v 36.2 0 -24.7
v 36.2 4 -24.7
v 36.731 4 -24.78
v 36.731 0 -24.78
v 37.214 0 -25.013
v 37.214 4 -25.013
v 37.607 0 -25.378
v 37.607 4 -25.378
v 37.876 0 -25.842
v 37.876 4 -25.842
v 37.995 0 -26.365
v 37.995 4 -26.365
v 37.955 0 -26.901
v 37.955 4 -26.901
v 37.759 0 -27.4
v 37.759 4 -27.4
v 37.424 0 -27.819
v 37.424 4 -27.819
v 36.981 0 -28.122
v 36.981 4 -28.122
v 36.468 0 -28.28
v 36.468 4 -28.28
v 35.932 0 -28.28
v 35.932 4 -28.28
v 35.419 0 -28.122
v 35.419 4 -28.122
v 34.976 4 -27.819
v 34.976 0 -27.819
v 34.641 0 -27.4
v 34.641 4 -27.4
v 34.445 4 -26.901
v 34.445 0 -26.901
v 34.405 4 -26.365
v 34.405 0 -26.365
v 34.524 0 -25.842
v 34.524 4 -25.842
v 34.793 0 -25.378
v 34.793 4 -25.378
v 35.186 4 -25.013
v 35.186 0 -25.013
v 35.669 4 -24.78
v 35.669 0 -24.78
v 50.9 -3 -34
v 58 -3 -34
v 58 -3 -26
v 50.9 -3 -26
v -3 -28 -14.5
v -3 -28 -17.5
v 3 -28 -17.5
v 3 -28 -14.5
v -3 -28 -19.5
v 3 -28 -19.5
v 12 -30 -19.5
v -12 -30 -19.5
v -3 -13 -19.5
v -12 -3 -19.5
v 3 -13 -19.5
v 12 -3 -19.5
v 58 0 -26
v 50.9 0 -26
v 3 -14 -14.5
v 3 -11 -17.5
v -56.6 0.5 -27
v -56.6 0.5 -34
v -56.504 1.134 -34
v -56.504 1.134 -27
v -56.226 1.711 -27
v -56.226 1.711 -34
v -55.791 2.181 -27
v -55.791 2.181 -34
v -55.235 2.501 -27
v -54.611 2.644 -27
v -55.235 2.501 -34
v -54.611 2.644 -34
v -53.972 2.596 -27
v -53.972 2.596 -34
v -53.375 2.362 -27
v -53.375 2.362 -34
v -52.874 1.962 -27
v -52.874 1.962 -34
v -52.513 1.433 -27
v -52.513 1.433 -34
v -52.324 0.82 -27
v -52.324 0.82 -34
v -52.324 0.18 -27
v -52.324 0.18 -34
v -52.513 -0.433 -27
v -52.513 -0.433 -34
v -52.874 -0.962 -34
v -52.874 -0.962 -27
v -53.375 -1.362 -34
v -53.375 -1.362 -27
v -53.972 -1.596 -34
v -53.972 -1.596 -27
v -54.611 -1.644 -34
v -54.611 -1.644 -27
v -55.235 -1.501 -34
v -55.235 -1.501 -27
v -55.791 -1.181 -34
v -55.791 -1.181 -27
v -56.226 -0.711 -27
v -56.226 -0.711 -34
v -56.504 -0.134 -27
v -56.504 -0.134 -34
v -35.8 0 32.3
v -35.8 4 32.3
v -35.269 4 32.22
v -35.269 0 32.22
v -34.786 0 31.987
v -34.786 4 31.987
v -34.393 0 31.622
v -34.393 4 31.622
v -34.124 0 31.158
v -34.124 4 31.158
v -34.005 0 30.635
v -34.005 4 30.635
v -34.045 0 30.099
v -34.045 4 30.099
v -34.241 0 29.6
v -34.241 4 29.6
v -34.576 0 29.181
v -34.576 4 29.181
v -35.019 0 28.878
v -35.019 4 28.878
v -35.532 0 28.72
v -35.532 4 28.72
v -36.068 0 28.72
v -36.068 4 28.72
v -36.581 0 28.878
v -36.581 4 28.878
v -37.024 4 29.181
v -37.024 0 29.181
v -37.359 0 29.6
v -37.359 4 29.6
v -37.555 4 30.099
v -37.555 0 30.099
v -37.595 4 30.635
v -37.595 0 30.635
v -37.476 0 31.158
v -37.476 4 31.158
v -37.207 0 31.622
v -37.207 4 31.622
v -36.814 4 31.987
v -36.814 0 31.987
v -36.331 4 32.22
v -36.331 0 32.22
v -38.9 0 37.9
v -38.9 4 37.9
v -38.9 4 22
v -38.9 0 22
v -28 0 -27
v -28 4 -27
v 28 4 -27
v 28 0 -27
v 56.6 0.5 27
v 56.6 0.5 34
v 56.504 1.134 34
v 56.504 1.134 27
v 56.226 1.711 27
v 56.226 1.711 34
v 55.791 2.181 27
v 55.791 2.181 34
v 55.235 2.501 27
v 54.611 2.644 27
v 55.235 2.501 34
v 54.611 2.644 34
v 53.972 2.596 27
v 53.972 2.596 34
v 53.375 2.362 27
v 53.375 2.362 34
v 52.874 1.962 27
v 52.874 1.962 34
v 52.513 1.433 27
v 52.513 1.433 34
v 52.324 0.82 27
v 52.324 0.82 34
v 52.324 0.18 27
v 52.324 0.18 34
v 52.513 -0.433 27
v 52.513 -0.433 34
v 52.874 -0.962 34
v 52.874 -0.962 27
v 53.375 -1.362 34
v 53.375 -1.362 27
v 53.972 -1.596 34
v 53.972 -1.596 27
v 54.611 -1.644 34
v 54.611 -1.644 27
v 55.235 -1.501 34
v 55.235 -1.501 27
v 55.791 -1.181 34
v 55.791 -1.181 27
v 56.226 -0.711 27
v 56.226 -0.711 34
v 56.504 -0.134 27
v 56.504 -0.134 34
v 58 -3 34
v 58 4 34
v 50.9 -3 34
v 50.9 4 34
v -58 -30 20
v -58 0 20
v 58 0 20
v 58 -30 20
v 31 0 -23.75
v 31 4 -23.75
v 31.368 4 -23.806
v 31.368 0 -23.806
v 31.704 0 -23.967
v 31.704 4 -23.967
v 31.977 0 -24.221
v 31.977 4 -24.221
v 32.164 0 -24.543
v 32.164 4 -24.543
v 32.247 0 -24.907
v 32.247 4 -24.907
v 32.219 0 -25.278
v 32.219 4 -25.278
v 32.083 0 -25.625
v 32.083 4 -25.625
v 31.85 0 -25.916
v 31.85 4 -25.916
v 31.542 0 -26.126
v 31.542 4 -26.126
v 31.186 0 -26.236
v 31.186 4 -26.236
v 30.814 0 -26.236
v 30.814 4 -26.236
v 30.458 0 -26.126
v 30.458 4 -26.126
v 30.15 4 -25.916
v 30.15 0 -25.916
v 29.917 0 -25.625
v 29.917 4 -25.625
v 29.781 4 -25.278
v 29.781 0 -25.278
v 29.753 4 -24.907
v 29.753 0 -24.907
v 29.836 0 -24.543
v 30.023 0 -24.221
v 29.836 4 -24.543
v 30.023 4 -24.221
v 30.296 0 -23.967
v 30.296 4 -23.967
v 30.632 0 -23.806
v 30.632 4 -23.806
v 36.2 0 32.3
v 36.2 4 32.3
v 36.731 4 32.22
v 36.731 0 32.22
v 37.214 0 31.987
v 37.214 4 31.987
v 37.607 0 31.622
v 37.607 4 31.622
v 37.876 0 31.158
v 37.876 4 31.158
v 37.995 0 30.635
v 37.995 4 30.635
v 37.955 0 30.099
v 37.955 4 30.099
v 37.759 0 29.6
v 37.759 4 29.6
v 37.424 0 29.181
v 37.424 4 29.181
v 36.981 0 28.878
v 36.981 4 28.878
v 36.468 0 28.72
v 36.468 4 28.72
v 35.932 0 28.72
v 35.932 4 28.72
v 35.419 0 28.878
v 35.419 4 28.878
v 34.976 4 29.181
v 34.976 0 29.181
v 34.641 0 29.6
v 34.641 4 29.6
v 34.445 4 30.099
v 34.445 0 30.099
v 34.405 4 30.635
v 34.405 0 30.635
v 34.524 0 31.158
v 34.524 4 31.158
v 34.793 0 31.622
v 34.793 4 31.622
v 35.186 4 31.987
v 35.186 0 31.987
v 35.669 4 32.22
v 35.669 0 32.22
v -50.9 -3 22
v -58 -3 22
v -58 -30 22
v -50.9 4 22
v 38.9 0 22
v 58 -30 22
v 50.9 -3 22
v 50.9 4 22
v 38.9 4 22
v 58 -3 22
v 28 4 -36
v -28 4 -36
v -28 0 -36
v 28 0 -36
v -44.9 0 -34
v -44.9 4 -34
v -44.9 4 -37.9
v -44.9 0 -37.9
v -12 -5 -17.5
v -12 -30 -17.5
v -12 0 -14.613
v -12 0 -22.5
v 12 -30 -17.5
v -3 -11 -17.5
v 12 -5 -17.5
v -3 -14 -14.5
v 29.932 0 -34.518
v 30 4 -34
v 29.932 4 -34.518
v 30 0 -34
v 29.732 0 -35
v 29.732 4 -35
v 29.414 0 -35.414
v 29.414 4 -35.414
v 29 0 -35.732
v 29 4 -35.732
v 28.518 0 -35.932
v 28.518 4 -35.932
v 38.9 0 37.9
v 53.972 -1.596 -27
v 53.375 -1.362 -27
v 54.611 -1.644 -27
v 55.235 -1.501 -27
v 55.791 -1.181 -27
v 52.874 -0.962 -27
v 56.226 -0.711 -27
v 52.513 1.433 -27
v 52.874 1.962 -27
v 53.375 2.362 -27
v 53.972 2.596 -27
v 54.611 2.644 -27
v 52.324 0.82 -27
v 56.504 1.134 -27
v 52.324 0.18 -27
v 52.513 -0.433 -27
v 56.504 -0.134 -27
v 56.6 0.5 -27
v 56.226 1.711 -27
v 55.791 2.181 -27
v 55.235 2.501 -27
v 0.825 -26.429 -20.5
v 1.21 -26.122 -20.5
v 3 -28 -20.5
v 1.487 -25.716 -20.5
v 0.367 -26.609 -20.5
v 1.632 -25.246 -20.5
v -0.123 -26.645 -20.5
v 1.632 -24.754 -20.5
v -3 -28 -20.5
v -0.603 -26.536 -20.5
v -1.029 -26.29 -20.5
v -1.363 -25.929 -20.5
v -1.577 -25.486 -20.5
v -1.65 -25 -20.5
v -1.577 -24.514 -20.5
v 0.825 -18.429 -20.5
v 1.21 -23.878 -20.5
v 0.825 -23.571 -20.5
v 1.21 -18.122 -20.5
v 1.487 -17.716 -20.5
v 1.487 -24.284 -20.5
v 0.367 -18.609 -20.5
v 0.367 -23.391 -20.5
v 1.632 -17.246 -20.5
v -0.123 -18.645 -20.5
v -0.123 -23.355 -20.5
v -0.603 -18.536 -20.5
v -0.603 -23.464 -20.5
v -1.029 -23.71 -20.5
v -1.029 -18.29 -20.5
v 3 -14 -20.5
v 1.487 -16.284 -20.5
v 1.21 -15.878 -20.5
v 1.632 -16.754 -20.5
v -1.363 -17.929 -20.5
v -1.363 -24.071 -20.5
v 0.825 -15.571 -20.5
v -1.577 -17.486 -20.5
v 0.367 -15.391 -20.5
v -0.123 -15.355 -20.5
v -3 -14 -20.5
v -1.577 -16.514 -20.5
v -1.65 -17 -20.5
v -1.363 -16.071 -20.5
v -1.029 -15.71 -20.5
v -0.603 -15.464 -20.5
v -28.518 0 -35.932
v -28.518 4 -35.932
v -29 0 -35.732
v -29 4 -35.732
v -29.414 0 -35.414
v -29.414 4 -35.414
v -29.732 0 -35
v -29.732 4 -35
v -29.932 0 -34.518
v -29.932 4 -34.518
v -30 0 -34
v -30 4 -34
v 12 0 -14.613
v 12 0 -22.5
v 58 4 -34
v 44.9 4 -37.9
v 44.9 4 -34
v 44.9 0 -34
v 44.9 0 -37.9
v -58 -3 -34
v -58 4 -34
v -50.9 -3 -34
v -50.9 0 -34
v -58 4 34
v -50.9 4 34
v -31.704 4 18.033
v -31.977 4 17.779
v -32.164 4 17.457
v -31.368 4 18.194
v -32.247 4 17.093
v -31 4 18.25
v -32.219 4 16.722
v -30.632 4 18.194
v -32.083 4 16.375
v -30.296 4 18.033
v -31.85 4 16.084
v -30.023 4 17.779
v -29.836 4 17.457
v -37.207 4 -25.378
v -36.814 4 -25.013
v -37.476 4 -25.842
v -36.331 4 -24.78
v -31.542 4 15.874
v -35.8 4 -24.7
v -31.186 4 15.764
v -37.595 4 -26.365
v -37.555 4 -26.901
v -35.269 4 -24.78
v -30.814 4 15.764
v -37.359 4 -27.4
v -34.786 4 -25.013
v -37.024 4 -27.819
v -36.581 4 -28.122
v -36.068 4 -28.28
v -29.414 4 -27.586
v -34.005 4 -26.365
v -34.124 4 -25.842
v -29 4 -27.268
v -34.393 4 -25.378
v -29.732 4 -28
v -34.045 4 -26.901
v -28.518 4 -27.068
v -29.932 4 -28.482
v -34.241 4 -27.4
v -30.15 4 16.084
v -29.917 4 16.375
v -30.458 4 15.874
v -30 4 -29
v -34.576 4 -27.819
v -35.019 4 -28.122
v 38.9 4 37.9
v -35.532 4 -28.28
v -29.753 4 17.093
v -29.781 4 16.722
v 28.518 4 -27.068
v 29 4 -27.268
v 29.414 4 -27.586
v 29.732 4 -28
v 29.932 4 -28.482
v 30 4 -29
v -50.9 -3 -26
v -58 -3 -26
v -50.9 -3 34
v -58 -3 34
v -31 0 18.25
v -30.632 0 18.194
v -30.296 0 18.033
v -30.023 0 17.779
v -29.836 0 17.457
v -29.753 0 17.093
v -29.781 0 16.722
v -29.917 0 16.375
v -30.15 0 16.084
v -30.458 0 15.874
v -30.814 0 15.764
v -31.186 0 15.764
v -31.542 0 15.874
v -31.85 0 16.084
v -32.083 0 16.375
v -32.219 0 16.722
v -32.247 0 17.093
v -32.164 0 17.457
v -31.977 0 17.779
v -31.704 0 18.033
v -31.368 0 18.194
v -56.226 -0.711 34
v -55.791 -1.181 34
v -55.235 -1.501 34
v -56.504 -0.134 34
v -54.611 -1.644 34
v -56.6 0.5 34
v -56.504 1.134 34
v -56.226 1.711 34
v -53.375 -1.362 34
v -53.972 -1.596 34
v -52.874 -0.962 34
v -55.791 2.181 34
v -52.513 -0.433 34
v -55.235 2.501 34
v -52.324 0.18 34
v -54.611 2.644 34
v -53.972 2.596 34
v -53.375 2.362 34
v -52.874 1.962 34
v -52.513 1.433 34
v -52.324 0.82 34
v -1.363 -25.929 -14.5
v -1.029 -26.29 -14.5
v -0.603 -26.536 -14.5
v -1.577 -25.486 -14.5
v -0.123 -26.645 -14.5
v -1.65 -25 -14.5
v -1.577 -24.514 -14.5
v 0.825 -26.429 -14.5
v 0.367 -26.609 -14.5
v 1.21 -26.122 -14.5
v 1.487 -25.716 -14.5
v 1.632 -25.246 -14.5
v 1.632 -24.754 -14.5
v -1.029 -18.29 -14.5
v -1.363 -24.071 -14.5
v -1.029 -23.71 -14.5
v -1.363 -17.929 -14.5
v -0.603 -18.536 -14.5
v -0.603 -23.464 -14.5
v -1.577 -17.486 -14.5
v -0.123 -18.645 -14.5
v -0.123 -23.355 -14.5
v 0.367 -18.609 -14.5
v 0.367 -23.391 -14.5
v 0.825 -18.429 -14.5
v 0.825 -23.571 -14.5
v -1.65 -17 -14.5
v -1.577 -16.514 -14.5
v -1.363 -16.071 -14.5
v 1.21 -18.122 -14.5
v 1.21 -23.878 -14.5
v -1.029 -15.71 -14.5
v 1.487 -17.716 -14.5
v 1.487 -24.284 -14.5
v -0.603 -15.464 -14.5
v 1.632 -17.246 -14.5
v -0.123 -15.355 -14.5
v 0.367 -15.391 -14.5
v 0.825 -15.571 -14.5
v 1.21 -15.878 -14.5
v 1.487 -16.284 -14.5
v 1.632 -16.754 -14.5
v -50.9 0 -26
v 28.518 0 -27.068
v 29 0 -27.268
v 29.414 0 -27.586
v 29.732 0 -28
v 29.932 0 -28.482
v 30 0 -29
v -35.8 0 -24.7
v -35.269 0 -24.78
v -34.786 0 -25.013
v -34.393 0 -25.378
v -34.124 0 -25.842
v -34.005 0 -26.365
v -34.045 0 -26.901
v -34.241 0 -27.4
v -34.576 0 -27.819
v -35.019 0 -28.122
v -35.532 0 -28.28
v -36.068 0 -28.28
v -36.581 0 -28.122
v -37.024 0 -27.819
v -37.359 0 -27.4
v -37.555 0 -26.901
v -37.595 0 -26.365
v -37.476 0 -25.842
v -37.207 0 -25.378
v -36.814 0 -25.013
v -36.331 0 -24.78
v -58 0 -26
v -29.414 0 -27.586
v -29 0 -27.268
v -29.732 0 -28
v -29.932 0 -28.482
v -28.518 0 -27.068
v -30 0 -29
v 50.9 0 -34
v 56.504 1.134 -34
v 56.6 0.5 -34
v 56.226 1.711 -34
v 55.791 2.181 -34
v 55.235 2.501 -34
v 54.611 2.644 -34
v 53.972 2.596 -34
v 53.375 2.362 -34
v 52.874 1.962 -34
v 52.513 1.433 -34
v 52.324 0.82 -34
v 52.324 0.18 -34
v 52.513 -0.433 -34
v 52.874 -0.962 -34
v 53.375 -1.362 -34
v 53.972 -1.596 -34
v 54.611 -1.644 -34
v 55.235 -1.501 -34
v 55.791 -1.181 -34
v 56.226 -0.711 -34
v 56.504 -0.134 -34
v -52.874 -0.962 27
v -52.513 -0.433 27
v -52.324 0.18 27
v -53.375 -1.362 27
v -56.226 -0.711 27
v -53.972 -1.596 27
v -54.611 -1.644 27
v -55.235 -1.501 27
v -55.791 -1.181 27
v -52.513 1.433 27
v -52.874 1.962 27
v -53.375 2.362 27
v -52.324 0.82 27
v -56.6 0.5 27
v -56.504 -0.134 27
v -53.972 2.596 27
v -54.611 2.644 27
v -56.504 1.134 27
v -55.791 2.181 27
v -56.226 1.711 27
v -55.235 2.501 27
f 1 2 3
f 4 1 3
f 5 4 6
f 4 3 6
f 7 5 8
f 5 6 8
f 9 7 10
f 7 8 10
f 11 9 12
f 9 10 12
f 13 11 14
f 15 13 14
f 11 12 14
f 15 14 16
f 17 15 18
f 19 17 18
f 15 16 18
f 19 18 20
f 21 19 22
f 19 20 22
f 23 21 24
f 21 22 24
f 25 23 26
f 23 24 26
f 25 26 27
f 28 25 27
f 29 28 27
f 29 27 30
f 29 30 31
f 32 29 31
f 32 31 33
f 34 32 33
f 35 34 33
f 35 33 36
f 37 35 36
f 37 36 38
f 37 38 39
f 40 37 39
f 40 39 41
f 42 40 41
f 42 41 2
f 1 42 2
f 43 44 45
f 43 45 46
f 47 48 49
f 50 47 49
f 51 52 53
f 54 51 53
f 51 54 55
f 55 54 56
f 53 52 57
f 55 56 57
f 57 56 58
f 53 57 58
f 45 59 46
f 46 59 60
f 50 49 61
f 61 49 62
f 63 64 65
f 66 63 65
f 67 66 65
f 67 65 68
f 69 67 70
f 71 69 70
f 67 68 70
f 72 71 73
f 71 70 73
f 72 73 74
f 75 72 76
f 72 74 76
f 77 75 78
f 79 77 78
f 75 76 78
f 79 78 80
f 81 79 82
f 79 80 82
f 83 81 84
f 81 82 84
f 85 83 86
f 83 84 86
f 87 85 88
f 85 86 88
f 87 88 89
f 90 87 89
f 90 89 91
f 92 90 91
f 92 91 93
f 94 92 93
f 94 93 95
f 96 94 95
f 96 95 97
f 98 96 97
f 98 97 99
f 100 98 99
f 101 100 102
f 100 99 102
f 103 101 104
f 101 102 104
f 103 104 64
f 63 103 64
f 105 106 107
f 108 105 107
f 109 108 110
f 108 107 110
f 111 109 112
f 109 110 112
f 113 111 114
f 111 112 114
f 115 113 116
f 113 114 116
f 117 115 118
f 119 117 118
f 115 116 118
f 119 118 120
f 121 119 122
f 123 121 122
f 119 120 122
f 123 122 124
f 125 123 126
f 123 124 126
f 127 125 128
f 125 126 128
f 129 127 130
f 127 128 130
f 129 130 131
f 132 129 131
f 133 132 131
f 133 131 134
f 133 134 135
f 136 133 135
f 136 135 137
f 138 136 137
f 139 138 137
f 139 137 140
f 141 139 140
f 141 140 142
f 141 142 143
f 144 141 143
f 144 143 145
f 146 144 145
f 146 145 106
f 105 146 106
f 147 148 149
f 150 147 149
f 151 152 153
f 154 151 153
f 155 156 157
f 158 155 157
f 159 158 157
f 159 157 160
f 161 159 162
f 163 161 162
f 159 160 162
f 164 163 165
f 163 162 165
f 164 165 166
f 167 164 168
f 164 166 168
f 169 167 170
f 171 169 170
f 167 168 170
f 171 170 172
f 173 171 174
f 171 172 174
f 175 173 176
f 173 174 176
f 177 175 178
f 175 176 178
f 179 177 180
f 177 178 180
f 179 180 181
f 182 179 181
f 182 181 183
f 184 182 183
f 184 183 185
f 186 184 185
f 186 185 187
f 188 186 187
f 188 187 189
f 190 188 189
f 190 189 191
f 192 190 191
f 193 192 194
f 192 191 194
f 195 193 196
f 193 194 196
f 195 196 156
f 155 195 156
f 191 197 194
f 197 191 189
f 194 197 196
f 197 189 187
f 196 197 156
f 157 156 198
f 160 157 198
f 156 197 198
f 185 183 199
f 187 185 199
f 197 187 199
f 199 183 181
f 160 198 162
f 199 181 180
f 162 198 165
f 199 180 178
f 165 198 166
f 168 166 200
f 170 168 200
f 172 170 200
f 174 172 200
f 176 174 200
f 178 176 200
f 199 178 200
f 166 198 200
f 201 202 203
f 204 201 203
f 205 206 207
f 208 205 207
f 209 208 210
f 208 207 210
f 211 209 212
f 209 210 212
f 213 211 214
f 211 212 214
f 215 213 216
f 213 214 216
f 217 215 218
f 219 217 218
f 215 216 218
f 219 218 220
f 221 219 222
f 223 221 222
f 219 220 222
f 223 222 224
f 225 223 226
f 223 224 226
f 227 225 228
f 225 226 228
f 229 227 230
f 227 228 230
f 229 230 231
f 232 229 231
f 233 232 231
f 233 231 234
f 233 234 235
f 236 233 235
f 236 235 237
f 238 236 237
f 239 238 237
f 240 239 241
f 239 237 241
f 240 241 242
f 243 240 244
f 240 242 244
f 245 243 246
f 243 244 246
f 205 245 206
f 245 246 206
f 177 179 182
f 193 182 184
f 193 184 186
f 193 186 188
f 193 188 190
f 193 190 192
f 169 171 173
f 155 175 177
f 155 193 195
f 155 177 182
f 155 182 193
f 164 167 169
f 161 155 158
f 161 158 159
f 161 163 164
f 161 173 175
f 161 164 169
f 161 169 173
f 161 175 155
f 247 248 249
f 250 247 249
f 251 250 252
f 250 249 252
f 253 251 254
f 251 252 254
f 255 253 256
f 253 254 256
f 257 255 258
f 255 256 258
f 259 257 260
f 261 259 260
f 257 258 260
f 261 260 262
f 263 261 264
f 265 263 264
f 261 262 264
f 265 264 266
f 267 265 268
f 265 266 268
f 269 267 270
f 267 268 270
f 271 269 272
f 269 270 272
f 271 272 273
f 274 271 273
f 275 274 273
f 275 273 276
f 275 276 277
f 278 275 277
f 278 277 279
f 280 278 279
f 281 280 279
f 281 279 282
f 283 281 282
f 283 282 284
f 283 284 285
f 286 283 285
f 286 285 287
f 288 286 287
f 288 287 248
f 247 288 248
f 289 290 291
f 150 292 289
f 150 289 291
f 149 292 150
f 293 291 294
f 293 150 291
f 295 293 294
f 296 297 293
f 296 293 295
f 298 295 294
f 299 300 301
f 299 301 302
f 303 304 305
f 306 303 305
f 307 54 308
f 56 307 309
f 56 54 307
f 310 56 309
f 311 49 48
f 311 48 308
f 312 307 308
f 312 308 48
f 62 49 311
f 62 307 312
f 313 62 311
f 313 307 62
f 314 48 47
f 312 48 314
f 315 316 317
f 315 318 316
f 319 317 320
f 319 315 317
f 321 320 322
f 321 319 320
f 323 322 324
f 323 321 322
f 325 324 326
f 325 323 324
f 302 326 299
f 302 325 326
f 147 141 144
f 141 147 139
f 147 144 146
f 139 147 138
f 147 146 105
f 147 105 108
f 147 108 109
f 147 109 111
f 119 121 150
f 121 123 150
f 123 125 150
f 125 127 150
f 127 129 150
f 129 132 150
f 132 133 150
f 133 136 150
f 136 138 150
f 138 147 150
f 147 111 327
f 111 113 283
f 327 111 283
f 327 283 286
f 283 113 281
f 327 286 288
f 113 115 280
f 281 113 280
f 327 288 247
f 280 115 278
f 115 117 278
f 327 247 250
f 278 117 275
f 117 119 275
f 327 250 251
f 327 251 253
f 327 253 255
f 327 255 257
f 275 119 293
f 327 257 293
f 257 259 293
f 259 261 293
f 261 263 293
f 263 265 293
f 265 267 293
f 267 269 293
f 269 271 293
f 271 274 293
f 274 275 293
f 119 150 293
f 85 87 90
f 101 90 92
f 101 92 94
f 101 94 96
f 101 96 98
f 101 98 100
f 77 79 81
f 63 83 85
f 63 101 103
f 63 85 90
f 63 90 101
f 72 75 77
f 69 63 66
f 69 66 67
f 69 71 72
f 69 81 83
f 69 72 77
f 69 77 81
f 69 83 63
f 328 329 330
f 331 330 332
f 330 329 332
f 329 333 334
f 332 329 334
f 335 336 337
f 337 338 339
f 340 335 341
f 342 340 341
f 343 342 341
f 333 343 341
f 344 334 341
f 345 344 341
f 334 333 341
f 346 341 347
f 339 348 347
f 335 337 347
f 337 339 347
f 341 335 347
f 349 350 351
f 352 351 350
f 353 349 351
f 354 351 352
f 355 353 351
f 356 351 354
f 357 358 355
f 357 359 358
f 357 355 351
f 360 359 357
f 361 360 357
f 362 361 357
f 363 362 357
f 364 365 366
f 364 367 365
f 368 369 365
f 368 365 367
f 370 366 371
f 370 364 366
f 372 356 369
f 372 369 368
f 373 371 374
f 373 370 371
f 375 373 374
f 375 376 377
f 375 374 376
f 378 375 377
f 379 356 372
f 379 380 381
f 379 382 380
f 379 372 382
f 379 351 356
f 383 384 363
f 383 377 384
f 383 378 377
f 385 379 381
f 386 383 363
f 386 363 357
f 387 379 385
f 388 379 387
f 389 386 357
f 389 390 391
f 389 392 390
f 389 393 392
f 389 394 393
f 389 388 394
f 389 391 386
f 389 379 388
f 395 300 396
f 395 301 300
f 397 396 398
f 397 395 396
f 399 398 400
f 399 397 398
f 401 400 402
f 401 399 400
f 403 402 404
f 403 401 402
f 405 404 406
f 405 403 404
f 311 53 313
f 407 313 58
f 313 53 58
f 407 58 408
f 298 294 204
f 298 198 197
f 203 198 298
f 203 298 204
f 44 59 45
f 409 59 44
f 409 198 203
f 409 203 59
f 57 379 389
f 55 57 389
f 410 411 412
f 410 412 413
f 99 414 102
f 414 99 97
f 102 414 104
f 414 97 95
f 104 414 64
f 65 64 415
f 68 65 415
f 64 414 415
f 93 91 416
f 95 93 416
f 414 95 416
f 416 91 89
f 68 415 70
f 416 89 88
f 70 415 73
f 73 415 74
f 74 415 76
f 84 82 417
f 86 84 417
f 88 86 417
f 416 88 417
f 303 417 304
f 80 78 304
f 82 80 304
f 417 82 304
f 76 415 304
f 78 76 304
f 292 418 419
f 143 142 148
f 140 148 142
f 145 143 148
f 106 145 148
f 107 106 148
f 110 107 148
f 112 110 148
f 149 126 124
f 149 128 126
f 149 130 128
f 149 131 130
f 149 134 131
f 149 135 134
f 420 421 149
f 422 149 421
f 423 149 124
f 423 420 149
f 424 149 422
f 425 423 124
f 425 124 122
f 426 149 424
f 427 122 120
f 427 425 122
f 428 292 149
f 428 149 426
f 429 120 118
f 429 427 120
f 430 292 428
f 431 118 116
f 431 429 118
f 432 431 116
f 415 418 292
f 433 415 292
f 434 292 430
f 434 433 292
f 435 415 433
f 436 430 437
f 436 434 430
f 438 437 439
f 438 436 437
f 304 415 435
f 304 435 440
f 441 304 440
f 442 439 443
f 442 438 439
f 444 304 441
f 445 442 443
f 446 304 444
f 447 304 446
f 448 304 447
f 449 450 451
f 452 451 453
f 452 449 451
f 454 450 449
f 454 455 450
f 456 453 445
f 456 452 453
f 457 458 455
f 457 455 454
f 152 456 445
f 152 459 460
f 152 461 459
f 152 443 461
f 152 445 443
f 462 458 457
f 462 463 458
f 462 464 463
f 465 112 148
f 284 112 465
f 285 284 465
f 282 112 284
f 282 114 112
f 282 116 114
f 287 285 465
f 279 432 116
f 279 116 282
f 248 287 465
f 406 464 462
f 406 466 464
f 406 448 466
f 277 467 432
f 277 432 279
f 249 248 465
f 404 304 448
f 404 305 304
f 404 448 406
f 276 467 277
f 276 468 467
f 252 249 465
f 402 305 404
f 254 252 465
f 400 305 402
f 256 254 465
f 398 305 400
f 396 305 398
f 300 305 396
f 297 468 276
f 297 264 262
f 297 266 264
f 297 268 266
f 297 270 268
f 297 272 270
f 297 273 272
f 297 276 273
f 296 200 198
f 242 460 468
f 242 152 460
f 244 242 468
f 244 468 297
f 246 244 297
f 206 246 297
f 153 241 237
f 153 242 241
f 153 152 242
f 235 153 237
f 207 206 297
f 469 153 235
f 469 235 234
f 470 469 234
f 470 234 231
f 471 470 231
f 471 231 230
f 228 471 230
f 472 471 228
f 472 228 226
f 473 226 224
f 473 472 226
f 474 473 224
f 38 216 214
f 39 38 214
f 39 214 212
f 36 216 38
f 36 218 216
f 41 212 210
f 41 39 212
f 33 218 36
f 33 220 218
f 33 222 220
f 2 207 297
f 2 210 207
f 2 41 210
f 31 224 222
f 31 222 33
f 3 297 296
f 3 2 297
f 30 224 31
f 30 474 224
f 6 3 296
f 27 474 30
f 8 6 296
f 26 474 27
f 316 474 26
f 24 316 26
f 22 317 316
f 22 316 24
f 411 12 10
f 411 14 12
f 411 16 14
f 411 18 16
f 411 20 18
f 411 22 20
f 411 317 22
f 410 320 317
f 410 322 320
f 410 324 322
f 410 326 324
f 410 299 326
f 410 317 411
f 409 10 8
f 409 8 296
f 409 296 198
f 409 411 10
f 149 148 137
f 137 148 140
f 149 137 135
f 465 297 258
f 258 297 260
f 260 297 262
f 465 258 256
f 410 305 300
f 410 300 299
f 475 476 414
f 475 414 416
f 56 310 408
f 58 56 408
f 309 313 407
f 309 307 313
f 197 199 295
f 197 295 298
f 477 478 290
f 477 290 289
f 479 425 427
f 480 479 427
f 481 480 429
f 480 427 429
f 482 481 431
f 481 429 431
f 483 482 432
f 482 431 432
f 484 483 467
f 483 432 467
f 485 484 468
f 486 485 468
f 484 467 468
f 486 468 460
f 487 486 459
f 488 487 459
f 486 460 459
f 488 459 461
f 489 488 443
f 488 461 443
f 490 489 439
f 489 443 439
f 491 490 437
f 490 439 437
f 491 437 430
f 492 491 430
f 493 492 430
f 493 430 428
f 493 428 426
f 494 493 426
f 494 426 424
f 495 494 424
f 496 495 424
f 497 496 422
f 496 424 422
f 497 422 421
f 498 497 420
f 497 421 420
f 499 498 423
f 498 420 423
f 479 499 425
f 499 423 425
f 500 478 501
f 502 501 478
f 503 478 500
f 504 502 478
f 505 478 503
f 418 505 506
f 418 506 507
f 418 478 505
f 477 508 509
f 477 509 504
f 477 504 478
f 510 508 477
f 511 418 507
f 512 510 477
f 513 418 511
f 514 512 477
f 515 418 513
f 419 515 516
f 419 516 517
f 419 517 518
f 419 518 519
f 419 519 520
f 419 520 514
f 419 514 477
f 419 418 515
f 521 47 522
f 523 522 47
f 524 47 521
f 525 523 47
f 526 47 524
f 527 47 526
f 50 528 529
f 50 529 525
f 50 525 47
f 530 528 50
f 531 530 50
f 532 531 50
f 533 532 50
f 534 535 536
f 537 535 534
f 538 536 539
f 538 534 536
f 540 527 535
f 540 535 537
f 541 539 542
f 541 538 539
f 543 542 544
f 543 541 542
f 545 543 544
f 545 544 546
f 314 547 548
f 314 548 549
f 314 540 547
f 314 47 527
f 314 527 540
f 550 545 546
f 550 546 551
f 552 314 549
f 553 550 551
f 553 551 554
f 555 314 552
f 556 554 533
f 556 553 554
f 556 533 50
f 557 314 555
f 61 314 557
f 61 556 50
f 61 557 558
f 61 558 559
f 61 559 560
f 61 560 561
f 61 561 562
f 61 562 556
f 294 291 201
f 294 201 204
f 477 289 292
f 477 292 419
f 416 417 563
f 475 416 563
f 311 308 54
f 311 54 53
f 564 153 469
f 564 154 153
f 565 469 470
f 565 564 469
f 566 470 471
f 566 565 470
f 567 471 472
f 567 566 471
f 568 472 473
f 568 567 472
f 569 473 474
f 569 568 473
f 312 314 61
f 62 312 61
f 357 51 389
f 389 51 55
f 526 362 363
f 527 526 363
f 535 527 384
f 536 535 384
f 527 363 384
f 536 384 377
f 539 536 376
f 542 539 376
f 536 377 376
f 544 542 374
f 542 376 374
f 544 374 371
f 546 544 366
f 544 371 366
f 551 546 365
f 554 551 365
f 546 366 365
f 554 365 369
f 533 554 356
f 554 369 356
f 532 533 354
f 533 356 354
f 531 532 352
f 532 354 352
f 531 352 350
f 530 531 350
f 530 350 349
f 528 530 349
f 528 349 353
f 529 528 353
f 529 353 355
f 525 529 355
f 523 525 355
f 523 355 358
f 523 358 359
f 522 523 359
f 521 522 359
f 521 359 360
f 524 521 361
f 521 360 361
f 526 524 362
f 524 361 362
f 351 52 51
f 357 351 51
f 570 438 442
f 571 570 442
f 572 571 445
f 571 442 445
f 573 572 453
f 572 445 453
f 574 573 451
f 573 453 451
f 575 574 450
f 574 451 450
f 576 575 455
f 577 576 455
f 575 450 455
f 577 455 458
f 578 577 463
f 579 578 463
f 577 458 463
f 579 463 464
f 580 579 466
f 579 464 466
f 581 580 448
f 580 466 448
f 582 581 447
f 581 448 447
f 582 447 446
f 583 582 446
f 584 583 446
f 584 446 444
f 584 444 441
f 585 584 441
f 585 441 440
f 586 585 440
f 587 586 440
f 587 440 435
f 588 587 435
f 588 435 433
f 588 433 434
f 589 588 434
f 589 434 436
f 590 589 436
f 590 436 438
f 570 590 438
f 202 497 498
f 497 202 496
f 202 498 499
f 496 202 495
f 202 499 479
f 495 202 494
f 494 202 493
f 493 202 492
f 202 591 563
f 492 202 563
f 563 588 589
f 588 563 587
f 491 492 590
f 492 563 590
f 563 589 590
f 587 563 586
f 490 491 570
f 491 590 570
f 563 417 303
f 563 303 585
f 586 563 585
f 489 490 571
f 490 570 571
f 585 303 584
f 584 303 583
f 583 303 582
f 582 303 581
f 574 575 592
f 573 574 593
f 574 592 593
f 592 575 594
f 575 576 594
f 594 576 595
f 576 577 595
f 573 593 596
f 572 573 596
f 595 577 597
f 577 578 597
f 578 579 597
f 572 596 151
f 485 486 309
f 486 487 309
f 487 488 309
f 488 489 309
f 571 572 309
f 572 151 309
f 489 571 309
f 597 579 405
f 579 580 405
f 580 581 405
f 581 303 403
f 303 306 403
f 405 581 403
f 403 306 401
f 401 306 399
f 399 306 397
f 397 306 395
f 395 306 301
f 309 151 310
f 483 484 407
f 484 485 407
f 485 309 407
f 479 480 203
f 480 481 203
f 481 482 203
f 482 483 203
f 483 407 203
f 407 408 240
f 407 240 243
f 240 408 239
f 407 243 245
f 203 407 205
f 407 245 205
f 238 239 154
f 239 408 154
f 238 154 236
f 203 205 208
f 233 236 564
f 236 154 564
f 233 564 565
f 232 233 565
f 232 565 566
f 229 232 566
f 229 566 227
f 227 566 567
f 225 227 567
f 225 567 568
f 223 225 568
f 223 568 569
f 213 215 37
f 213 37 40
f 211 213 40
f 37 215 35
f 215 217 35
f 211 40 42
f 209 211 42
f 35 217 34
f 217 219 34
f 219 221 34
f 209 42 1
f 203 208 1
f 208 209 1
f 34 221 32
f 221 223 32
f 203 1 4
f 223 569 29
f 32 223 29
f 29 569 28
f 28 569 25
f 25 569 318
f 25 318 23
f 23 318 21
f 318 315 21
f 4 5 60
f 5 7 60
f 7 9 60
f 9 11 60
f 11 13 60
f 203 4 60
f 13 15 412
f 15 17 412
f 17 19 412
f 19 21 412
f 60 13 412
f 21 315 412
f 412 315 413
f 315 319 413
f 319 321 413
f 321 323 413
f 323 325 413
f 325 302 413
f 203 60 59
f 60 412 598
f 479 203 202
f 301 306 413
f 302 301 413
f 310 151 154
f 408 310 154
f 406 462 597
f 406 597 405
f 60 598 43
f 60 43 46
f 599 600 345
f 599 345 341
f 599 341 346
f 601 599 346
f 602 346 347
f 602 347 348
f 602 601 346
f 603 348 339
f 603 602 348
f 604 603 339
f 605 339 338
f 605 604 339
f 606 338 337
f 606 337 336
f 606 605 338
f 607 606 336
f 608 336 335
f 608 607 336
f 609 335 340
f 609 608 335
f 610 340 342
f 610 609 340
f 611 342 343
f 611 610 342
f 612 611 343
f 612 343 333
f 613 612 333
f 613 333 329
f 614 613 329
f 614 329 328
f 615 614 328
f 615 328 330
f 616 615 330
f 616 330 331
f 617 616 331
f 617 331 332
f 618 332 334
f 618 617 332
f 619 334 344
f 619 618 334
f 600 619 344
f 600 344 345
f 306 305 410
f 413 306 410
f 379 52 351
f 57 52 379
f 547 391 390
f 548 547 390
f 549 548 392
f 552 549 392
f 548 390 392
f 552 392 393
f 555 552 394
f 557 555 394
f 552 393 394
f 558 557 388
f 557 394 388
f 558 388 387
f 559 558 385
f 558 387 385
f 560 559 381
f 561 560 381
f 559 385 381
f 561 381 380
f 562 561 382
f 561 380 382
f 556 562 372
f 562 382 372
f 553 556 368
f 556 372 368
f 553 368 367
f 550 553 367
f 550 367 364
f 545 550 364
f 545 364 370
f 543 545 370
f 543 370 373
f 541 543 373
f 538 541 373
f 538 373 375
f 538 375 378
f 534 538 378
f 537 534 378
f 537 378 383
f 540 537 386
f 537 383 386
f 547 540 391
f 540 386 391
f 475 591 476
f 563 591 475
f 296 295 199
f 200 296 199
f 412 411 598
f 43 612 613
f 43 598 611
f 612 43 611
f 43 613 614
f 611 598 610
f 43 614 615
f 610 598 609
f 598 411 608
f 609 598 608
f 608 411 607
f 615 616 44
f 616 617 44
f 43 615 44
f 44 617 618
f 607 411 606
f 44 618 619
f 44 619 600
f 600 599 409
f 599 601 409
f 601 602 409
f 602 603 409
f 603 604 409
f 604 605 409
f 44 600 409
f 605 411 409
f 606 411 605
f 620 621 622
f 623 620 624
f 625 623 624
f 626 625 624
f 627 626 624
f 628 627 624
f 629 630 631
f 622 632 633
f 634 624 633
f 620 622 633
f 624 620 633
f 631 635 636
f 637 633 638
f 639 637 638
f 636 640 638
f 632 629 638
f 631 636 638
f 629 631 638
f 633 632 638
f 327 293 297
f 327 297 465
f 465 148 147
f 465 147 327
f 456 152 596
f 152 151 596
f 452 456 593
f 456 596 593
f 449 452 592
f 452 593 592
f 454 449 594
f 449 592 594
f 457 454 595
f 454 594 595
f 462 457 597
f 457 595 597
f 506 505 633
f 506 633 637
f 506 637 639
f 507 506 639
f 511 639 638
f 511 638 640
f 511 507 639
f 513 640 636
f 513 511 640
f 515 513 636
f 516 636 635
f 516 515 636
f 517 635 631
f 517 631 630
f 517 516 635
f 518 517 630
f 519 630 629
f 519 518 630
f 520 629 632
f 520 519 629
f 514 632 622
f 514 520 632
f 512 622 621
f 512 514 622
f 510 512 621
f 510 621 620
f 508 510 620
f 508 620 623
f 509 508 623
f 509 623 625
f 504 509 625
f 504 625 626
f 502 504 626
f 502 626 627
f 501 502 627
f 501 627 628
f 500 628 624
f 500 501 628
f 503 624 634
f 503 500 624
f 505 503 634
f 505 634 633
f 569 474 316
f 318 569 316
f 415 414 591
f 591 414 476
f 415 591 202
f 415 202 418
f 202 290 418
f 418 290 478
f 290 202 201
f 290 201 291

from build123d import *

# Parameters (mm, degrees)
BOSS_EXTRUDE1_DEPTH             = 4
SKETCH3_W                       = 7.1
SKETCH3_H                       = 8
BOSS_EXTRUDE3_DEPTH             = 3
SKETCH4_R                       = 2.15
CUT_EXTRUDE1_DEPTH              = 7
MIRROR2_COPY_1_SKETCH_W         = 7.1
MIRROR2_COPY_1_SKETCH_H         = 8
MIRROR2_COPY_1_DEPTH            = 3
MIRROR2_COPY_2_SKETCH_R         = 2.15
MIRROR2_COPY_2_DEPTH            = 7
SKETCH5_W                       = 60
SKETCH5_H                       = 9
CUT_EXTRUDE2_DEPTH              = 72.37226352
FILLET1_R                       = 2
SKETCH7_W                       = 101.8
SKETCH7_H                       = 1
CUT_EXTRUDE3_DEPTH              = 72.37226352
SKETCH8_W                       = 116
SKETCH8_H                       = 2
BOSS_EXTRUDE4_DEPTH             = 30
SKETCH9_W                       = 12
SKETCH9_H                       = 18
CUT_EXTRUDE4_DEPTH              = 10
SKETCH10_W                      = 7.1
SKETCH10_H                      = 4
BOSS_EXTRUDE5_DEPTH             = 3
SKETCH12_W                      = 1.5
SKETCH12_H                      = 4
BOSS_EXTRUDE6_DEPTH             = 2
SKETCH13_W                      = 36
SKETCH13_H                      = 2
BOSS_EXTRUDE7_DEPTH             = 30
SKETCH14_W                      = 1.5
SKETCH14_H                      = 4
BOSS_EXTRUDE8_DEPTH             = 1
BOSS_EXTRUDE9_REACH             = 79.055
BOSS_EXTRUDE9_DIRECTION_2_REACH = 79.055
SKETCH16_W                      = 20
SKETCH16_H                      = 28
SKETCH16_W_2                    = 14.6
SKETCH16_H_2                    = 9.2
BOSS_EXTRUDE10_DEPTH            = 2.6
SKETCH17_W                      = 12
SKETCH17_H                      = 18
CUT_EXTRUDE5_DEPTH              = 78.054785705
SKETCH18_W                      = 6
SKETCH18_H                      = 6
CUT_EXTRUDE6_DEPTH              = 79.759380394
SKETCH22_R                      = 1.25
CUT_EXTRUDE7_DEPTH              = 4
SKETCH25_W                      = 6
SKETCH25_H                      = 30
CUT_EXTRUDE11_DEPTH             = 10
CUT_EXTRUDE12_DEPTH             = 78.810282097
CUT_EXTRUDE12_DEPTH_BACK        = 78.810282097
SKETCH26_W                      = 6.843369225
SKETCH26_H                      = 31.263319976
SKETCH26_W_2                    = 6.53419365
SKETCH26_H_2                    = 28.524331859
SKETCH27_R                      = 1.25
CUT_EXTRUDE13_DEPTH             = 79.230428862
SKETCH28_W                      = 89.8
SKETCH28_H                      = 0.6
SKETCH28_W_2                    = 77.8
CUT_EXTRUDE14_DEPTH             = 79.230428862
CHAMFER1_SIZE                   = 2
SKETCH29_W                      = 20
SKETCH29_H                      = 28
CUT_EXTRUDE15_DEPTH             = 17.4
CUT_EXTRUDE16_DEPTH             = 2
SKETCH30_W                      = 89.8
SKETCH30_H                      = 1.5
SKETCH30_W_2                    = 77.8
CUT_EXTRUDE17_DEPTH             = 78.925348892
SKETCH32_W                      = 6
SKETCH32_H                      = 14
BOSS_EXTRUDE11_DEPTH            = 1
CHAMFER2_SIZE                   = 1
SKETCH34_W                      = 6
SKETCH34_H                      = 14
BOSS_EXTRUDE12_DEPTH            = 3
CHAMFER3_SIZE                   = 3
SKETCH33_R                      = 1.65
CUT_EXTRUDE18_DEPTH             = 6
CHAMFER4_SIZE                   = 3
SKETCH35_R                      = 1.8
CUT_EXTRUDE19_DEPTH             = 78.177781777


with BuildPart() as part:
    # Sketch1 → Boss-Extrude1 (new body)
    with BuildSketch(Plane(origin=(0, 0, 0), x_dir=(1, 0, 0), z_dir=(0, 1, 0))):
        Polygon((-58, -34), (-50.9, -34), (-50.9, -41), (50.9, -41), (50.9, -34), (58, -34), (58, 34), (50.9, 34), (50.9, 41), (-50.9, 41), (-50.9, 34), (-58, 34), align=None)
    extrude(amount=BOSS_EXTRUDE1_DEPTH)

    # Sketch3 → Boss-Extrude3 (add)
    with BuildSketch(Plane.XZ):
        with Locations((-54.45, -30)):
            Rectangle(SKETCH3_W, SKETCH3_H)
    boss_extrude3 = extrude(amount=BOSS_EXTRUDE3_DEPTH)

    # Sketch4 → Cut-Extrude1 (cut)
    with BuildSketch(Plane(origin=(0, 0, -34), x_dir=(-1, 0, 0), z_dir=(0, 0, -1))):
        with Locations((54.45, 0.5)):
            Circle(SKETCH4_R)
    cut_extrude1 = extrude(amount=-CUT_EXTRUDE1_DEPTH, mode=Mode.SUBTRACT)

    # Mirror1: Boss-Extrude3, Cut-Extrude1 across plane
    add(boss_extrude3.mirror(Plane(origin=(0, 0, 0), x_dir=(0, 0, 1), z_dir=(1, 0, 0))))
    add(cut_extrude1.mirror(Plane(origin=(0, 0, 0), x_dir=(0, 0, 1), z_dir=(1, 0, 0))), mode=Mode.SUBTRACT)

    # Mirror2: Boss-Extrude3, Cut-Extrude1 across plane
    add(boss_extrude3.mirror(Plane.XY))
    add(cut_extrude1.mirror(Plane.XY), mode=Mode.SUBTRACT)

    # Mirror2 copy 1 sketch → Mirror2 copy 1 (add)
    with BuildSketch(Plane(origin=(0, 0, 0), x_dir=(-1, 0, 0), z_dir=(0, -1, 0))):
        with Locations((-54.45, -30)):
            Rectangle(MIRROR2_COPY_1_SKETCH_W, MIRROR2_COPY_1_SKETCH_H)
    extrude(amount=MIRROR2_COPY_1_DEPTH)

    # Mirror2 copy 2 sketch → Mirror2 copy 2 (cut)
    with BuildSketch(Plane.XY.offset(34)):
        with Locations((54.45, 0.5)):
            Circle(MIRROR2_COPY_2_SKETCH_R)
    extrude(amount=-MIRROR2_COPY_2_DEPTH, mode=Mode.SUBTRACT)

    # Sketch5 → Cut-Extrude2 (cut, through all)
    with BuildSketch(Plane(origin=(0, 4, 0), x_dir=(1, 0, 0), z_dir=(0, 1, 0))):
        with Locations((0, 31.5)):
            Rectangle(SKETCH5_W, SKETCH5_H)
    extrude(amount=-CUT_EXTRUDE2_DEPTH, mode=Mode.SUBTRACT)

    # Fillet1
    fillet1_edges = [part.edges().sort_by_distance(p)[0] for p in [
        (-30, 2, -27),
        (-30, 2, -36),
        (30, 2, -36),
        (30, 2, -27),
    ]]
    fillet(fillet1_edges, radius=FILLET1_R)

    # Sketch7 → Cut-Extrude3 (cut, through all)
    with BuildSketch(Plane(origin=(0, 4, 0), x_dir=(1, 0, 0), z_dir=(0, 1, 0))):
        with Locations((0, 40.5)):
            Rectangle(SKETCH7_W, SKETCH7_H)
        with Locations((0, -40.5)):
            Rectangle(SKETCH7_W, SKETCH7_H)
    extrude(amount=-CUT_EXTRUDE3_DEPTH, mode=Mode.SUBTRACT)

    # Sketch8 → Boss-Extrude4 (add)
    with BuildSketch(Plane.XZ):
        with Locations((0, 21)):
            Rectangle(SKETCH8_W, SKETCH8_H)
    extrude(amount=BOSS_EXTRUDE4_DEPTH)

    # Sketch9 → Cut-Extrude4 (cut)
    with BuildSketch(Plane(origin=(0, 4, 0), x_dir=(1, 0, 0), z_dir=(0, 1, 0))):
        with Locations((-44.9, -31)):
            Rectangle(SKETCH9_W, SKETCH9_H)
    extrude(amount=-CUT_EXTRUDE4_DEPTH, mode=Mode.SUBTRACT)

    # Sketch10 → Boss-Extrude5 (add)
    with BuildSketch(Plane.XZ.offset(3)):
        with Locations((-54.45, 24)):
            Rectangle(SKETCH10_W, SKETCH10_H)
        with Locations((54.45, 24)):
            Rectangle(SKETCH10_W, SKETCH10_H)
    extrude(amount=-BOSS_EXTRUDE5_DEPTH)

    # Sketch12 → Boss-Extrude6 (add)
    # profile 1 of 2: a face of its own
    with BuildSketch(Plane.ZY.offset(51)):
        Polygon((22, -5.8), (22, -16.2), (24.7, -13.5), (24.7, -8.5), align=None)
        with Locations((23.35, -11)):
            Rectangle(SKETCH12_W, SKETCH12_H, mode=Mode.SUBTRACT)
    # profile 2 of 2: a face of its own
    with BuildSketch(Plane.ZY.offset(51)):
        Polygon((22, -20.8), (22, -31.2), (24.7, -28.5), (24.7, -23.5), align=None)
        with Locations((23.35, -26)):
            Rectangle(SKETCH12_W, SKETCH12_H, mode=Mode.SUBTRACT)
    boss_extrude6 = extrude(amount=-BOSS_EXTRUDE6_DEPTH)

    # Mirror3: Boss-Extrude6 across plane
    add(boss_extrude6.mirror(Plane(origin=(-44.9, 0, 0), x_dir=(0, 0, 1), z_dir=(1, 0, 0))))

    # Sketch13 → Boss-Extrude7 (add)
    with BuildSketch(Plane.XZ):
        with Locations((0, -18.5)):
            Rectangle(SKETCH13_W, SKETCH13_H)
    extrude(amount=BOSS_EXTRUDE7_DEPTH)

    # Boss-Extrude9: up to this face of the body (flat: up to its plane)
    boss_extrude9_end = Plane(part.part.faces().sort_by_distance((-18, -15, -18.5))[0])
    # Sketch15 → Boss-Extrude9 (add, up to the picked face)
    with BuildSketch(Plane(origin=(0, 0, 0), x_dir=(0, 0, -1), z_dir=(1, 0, 0)), mode=Mode.PRIVATE) as boss_extrude9_sk1:
        Polygon((17.5, 0), (17.5, -5), (14.613248654, 0), align=None)
    boss_extrude9_tool1 = split(extrude(boss_extrude9_sk1.sketch, amount=-BOSS_EXTRUDE9_REACH, mode=Mode.PRIVATE), bisect_by=boss_extrude9_end, keep=Keep.BOTH, mode=Mode.PRIVATE)
    add(boss_extrude9_tool1.solids().sort_by(Axis((0, -1.666667, -16.53775), (-1, 0, 0)))[0])

    # Boss-Extrude9 direction 2: up to this face of the body (flat: up to its plane)
    boss_extrude9_direction_2_end = Plane(part.part.faces().sort_by_distance((18, -15, -18.5))[0])
    # Sketch15 → Boss-Extrude9 direction 2 (add, up to the picked face)
    with BuildSketch(Plane(origin=(0, 0, 0), x_dir=(0, 0, -1), z_dir=(1, 0, 0)), mode=Mode.PRIVATE) as boss_extrude9_direction_2_sk1:
        Polygon((17.5, 0), (17.5, -5), (14.613248654, 0), align=None)
    boss_extrude9_direction_2_tool1 = split(extrude(boss_extrude9_direction_2_sk1.sketch, amount=BOSS_EXTRUDE9_DIRECTION_2_REACH, mode=Mode.PRIVATE), bisect_by=boss_extrude9_direction_2_end, keep=Keep.BOTH, mode=Mode.PRIVATE)
    add(boss_extrude9_direction_2_tool1.solids().sort_by(Axis((0, -1.666667, -16.53775), (1, 0, 0)))[0])

    # Sketch16 → Boss-Extrude10 (add)
    with BuildSketch(Plane.XY.offset(40)):
        with Locations((28, -14)):
            Rectangle(SKETCH16_W, SKETCH16_H)
        with Locations((28, -20.4)):
            Rectangle(SKETCH16_W_2, SKETCH16_H_2, mode=Mode.SUBTRACT)
    extrude(amount=-BOSS_EXTRUDE10_DEPTH)

    # Sketch17 → Cut-Extrude5 (cut, through all)
    with BuildSketch(Plane.XZ):
        with Locations((44.9, 31)):
            Rectangle(SKETCH17_W, SKETCH17_H)
    extrude(amount=-CUT_EXTRUDE5_DEPTH, mode=Mode.SUBTRACT)

    # Sketch18 → Cut-Extrude6 (cut, through all)
    with BuildSketch(Plane(origin=(0, 4, 0), x_dir=(1, 0, 0), z_dir=(0, 1, 0))):
        with Locations((47.9, 37)):
            Rectangle(SKETCH18_W, SKETCH18_H)
        with Locations((-47.9, 37)):
            Rectangle(SKETCH18_W, SKETCH18_H)
    extrude(amount=-CUT_EXTRUDE6_DEPTH, mode=Mode.SUBTRACT)

    # Sketch22 → Cut-Extrude7 (cut)
    with BuildSketch(Plane(origin=(0, 4, 0), x_dir=(1, 0, 0), z_dir=(0, 1, 0))):
        with Locations(Location((31, 25, 0), (0, 0, 270))):
            Circle(SKETCH22_R)
        with Locations(Location((-31, -17, 0), (0, 0, 270))):
            Circle(SKETCH22_R)
    extrude(amount=-CUT_EXTRUDE7_DEPTH, mode=Mode.SUBTRACT)

    # Sketch25 → Cut-Extrude11 (cut)
    with BuildSketch(Plane(origin=(0, 0, -19.5), x_dir=(-1, 0, 0), z_dir=(0, 0, -1))):
        with Locations((-15, -15)):
            Rectangle(SKETCH25_W, SKETCH25_H)
        with Locations((15, -15)):
            Rectangle(SKETCH25_W, SKETCH25_H)
    extrude(amount=-CUT_EXTRUDE11_DEPTH, mode=Mode.SUBTRACT)

    # Sketch26 → Cut-Extrude12 (cut, two sides: drawn at the far end of the back side and taken through both)
    with BuildSketch(Plane.ZY.offset(1).offset(-CUT_EXTRUDE12_DEPTH_BACK)):
        with Locations((-23.779868126, -20.73082856)):
            Rectangle(SKETCH26_W, SKETCH26_H)
        with Locations((25.267096825, -20.06216593)):
            Rectangle(SKETCH26_W_2, SKETCH26_H_2)
    extrude(amount=CUT_EXTRUDE12_DEPTH + CUT_EXTRUDE12_DEPTH_BACK, mode=Mode.SUBTRACT)

    # Sketch27 → Cut-Extrude13 (cut, through all)
    with BuildSketch(Plane(origin=(0, 4, 0), x_dir=(1, 0, 0), z_dir=(0, 1, 0))):
        with Locations(Location((-35.8, 26.5, 0), (0, 0, 270))):
            Circle(SKETCH27_R)
        with Locations(Location((-35.8, -30.5, 0), (0, 0, 270))):
            Circle(SKETCH27_R)
        with Locations(Location((36.2, -30.5, 0), (0, 0, 270))):
            Circle(SKETCH27_R)
        with Locations(Location((36.2, 26.5, 0), (0, 0, 270))):
            Circle(SKETCH27_R)
    extrude(amount=-CUT_EXTRUDE13_DEPTH, mode=Mode.SUBTRACT)

    # Sketch28 → Cut-Extrude14 (cut, through all)
    with BuildSketch(Plane(origin=(0, 4, 0), x_dir=(1, 0, 0), z_dir=(0, 1, 0))):
        with Locations((0, 39.7)):
            Rectangle(SKETCH28_W, SKETCH28_H)
        with Locations((0, -39.7)):
            Rectangle(SKETCH28_W_2, SKETCH28_H)
    extrude(amount=-CUT_EXTRUDE14_DEPTH, mode=Mode.SUBTRACT)

    # Chamfer1
    chamfer1_edges = [part.edges().sort_by_distance(p)[0] for p in [
        (28, 0, 37.4),
    ]]
    chamfer(chamfer1_edges, length=CHAMFER1_SIZE)

    # Sketch29 → Cut-Extrude15 (cut)
    with BuildSketch(Plane.XY.offset(39.4)):
        with Locations((28, -14)):
            Rectangle(SKETCH29_W, SKETCH29_H)
    extrude(amount=-CUT_EXTRUDE15_DEPTH, mode=Mode.SUBTRACT)

    # Sketch30 → Cut-Extrude17 (cut, through all)
    with BuildSketch(Plane(origin=(0, 4, 0), x_dir=(1, 0, 0), z_dir=(0, 1, 0))):
        with Locations((0, 38.65)):
            Rectangle(SKETCH30_W, SKETCH30_H)
        with Locations((0, -38.65)):
            Rectangle(SKETCH30_W_2, SKETCH30_H)
    extrude(amount=-CUT_EXTRUDE17_DEPTH, mode=Mode.SUBTRACT)

    # Sketch32 → Boss-Extrude11 (add)
    with BuildSketch(Plane(origin=(0, 0, -19.5), x_dir=(-1, 0, 0), z_dir=(0, 0, -1))):
        with Locations((0, -21)):
            Rectangle(SKETCH32_W, SKETCH32_H)
    extrude(amount=BOSS_EXTRUDE11_DEPTH)

    # Chamfer2
    chamfer2_edges = [part.edges().sort_by_distance(p)[0] for p in [
        (0, -14, -19.5),
    ]]
    chamfer(chamfer2_edges, length=CHAMFER2_SIZE - 0.0001)  # a hair under: the kernel refuses the full size

    # Sketch34 → Boss-Extrude12 (add)
    with BuildSketch(Plane.XY.offset(-17.5)):
        with Locations((0, -21)):
            Rectangle(SKETCH34_W, SKETCH34_H)
    extrude(amount=BOSS_EXTRUDE12_DEPTH)

    # Chamfer3
    chamfer3_edges = [part.edges().sort_by_distance(p)[0] for p in [
        (0, -14, -17.5),
    ]]
    chamfer(chamfer3_edges, length=CHAMFER3_SIZE - 0.0001)  # a hair under: the kernel refuses the full size

    # Sketch33 → Cut-Extrude18 (cut)
    with BuildSketch(Plane(origin=(0, 0, -20.5), x_dir=(-1, 0, 0), z_dir=(0, 0, -1))):
        with Locations((0, -17)):
            Circle(SKETCH33_R)
        with Locations((0, -25)):
            Circle(SKETCH33_R)
    extrude(amount=-CUT_EXTRUDE18_DEPTH, mode=Mode.SUBTRACT)

    # Chamfer4
    chamfer4_edges = [part.edges().sort_by_distance(p)[0] for p in [
        (0, 0, -19.5),
    ]]
    chamfer(chamfer4_edges, length=CHAMFER4_SIZE)

    # Sketch35 → Cut-Extrude19 (cut, through all)
    with BuildSketch(Plane(origin=(0, 4, 0), x_dir=(1, 0, 0), z_dir=(0, 1, 0))):
        with Locations(Location((-35.8, 26.5, 0), (0, 0, 270))):
            Circle(SKETCH35_R)
        with Locations(Location((36.2, 26.5, 0), (0, 0, 270))):
            Circle(SKETCH35_R)
        with Locations(Location((36.2, -30.5, 0), (0, 0, 270))):
            Circle(SKETCH35_R)
        with Locations(Location((-35.8, -30.5, 0), (0, 0, 270))):
            Circle(SKETCH35_R)
    extrude(amount=-CUT_EXTRUDE19_DEPTH, mode=Mode.SUBTRACT)


with BuildPart() as body_2:
    # Sketch14 → Boss-Extrude8 (new, symmetric)
    with BuildSketch(Plane(origin=(0, 0, 0), x_dir=(0, 0, -1), z_dir=(1, 0, 0))):
        Polygon((24.2, -8.5), (21.5, -5.8), (21.5, -16.2), (24.2, -13.5), align=None)
        with Locations((22.85, -11)):
            Rectangle(SKETCH14_W, SKETCH14_H, mode=Mode.SUBTRACT)
    extrude(amount=BOSS_EXTRUDE8_DEPTH, both=True)

    # Sketch31 → Cut-Extrude16 (cut)
    with BuildSketch(Plane.ZY.offset(1)):
        Polygon((-24.2, -8.5), (-24.2, -13.5), (-21.5, -16.2), (-21.5, -5.8), align=None)
    extrude(amount=-CUT_EXTRUDE16_DEPTH, mode=Mode.SUBTRACT)


solid = part.part
